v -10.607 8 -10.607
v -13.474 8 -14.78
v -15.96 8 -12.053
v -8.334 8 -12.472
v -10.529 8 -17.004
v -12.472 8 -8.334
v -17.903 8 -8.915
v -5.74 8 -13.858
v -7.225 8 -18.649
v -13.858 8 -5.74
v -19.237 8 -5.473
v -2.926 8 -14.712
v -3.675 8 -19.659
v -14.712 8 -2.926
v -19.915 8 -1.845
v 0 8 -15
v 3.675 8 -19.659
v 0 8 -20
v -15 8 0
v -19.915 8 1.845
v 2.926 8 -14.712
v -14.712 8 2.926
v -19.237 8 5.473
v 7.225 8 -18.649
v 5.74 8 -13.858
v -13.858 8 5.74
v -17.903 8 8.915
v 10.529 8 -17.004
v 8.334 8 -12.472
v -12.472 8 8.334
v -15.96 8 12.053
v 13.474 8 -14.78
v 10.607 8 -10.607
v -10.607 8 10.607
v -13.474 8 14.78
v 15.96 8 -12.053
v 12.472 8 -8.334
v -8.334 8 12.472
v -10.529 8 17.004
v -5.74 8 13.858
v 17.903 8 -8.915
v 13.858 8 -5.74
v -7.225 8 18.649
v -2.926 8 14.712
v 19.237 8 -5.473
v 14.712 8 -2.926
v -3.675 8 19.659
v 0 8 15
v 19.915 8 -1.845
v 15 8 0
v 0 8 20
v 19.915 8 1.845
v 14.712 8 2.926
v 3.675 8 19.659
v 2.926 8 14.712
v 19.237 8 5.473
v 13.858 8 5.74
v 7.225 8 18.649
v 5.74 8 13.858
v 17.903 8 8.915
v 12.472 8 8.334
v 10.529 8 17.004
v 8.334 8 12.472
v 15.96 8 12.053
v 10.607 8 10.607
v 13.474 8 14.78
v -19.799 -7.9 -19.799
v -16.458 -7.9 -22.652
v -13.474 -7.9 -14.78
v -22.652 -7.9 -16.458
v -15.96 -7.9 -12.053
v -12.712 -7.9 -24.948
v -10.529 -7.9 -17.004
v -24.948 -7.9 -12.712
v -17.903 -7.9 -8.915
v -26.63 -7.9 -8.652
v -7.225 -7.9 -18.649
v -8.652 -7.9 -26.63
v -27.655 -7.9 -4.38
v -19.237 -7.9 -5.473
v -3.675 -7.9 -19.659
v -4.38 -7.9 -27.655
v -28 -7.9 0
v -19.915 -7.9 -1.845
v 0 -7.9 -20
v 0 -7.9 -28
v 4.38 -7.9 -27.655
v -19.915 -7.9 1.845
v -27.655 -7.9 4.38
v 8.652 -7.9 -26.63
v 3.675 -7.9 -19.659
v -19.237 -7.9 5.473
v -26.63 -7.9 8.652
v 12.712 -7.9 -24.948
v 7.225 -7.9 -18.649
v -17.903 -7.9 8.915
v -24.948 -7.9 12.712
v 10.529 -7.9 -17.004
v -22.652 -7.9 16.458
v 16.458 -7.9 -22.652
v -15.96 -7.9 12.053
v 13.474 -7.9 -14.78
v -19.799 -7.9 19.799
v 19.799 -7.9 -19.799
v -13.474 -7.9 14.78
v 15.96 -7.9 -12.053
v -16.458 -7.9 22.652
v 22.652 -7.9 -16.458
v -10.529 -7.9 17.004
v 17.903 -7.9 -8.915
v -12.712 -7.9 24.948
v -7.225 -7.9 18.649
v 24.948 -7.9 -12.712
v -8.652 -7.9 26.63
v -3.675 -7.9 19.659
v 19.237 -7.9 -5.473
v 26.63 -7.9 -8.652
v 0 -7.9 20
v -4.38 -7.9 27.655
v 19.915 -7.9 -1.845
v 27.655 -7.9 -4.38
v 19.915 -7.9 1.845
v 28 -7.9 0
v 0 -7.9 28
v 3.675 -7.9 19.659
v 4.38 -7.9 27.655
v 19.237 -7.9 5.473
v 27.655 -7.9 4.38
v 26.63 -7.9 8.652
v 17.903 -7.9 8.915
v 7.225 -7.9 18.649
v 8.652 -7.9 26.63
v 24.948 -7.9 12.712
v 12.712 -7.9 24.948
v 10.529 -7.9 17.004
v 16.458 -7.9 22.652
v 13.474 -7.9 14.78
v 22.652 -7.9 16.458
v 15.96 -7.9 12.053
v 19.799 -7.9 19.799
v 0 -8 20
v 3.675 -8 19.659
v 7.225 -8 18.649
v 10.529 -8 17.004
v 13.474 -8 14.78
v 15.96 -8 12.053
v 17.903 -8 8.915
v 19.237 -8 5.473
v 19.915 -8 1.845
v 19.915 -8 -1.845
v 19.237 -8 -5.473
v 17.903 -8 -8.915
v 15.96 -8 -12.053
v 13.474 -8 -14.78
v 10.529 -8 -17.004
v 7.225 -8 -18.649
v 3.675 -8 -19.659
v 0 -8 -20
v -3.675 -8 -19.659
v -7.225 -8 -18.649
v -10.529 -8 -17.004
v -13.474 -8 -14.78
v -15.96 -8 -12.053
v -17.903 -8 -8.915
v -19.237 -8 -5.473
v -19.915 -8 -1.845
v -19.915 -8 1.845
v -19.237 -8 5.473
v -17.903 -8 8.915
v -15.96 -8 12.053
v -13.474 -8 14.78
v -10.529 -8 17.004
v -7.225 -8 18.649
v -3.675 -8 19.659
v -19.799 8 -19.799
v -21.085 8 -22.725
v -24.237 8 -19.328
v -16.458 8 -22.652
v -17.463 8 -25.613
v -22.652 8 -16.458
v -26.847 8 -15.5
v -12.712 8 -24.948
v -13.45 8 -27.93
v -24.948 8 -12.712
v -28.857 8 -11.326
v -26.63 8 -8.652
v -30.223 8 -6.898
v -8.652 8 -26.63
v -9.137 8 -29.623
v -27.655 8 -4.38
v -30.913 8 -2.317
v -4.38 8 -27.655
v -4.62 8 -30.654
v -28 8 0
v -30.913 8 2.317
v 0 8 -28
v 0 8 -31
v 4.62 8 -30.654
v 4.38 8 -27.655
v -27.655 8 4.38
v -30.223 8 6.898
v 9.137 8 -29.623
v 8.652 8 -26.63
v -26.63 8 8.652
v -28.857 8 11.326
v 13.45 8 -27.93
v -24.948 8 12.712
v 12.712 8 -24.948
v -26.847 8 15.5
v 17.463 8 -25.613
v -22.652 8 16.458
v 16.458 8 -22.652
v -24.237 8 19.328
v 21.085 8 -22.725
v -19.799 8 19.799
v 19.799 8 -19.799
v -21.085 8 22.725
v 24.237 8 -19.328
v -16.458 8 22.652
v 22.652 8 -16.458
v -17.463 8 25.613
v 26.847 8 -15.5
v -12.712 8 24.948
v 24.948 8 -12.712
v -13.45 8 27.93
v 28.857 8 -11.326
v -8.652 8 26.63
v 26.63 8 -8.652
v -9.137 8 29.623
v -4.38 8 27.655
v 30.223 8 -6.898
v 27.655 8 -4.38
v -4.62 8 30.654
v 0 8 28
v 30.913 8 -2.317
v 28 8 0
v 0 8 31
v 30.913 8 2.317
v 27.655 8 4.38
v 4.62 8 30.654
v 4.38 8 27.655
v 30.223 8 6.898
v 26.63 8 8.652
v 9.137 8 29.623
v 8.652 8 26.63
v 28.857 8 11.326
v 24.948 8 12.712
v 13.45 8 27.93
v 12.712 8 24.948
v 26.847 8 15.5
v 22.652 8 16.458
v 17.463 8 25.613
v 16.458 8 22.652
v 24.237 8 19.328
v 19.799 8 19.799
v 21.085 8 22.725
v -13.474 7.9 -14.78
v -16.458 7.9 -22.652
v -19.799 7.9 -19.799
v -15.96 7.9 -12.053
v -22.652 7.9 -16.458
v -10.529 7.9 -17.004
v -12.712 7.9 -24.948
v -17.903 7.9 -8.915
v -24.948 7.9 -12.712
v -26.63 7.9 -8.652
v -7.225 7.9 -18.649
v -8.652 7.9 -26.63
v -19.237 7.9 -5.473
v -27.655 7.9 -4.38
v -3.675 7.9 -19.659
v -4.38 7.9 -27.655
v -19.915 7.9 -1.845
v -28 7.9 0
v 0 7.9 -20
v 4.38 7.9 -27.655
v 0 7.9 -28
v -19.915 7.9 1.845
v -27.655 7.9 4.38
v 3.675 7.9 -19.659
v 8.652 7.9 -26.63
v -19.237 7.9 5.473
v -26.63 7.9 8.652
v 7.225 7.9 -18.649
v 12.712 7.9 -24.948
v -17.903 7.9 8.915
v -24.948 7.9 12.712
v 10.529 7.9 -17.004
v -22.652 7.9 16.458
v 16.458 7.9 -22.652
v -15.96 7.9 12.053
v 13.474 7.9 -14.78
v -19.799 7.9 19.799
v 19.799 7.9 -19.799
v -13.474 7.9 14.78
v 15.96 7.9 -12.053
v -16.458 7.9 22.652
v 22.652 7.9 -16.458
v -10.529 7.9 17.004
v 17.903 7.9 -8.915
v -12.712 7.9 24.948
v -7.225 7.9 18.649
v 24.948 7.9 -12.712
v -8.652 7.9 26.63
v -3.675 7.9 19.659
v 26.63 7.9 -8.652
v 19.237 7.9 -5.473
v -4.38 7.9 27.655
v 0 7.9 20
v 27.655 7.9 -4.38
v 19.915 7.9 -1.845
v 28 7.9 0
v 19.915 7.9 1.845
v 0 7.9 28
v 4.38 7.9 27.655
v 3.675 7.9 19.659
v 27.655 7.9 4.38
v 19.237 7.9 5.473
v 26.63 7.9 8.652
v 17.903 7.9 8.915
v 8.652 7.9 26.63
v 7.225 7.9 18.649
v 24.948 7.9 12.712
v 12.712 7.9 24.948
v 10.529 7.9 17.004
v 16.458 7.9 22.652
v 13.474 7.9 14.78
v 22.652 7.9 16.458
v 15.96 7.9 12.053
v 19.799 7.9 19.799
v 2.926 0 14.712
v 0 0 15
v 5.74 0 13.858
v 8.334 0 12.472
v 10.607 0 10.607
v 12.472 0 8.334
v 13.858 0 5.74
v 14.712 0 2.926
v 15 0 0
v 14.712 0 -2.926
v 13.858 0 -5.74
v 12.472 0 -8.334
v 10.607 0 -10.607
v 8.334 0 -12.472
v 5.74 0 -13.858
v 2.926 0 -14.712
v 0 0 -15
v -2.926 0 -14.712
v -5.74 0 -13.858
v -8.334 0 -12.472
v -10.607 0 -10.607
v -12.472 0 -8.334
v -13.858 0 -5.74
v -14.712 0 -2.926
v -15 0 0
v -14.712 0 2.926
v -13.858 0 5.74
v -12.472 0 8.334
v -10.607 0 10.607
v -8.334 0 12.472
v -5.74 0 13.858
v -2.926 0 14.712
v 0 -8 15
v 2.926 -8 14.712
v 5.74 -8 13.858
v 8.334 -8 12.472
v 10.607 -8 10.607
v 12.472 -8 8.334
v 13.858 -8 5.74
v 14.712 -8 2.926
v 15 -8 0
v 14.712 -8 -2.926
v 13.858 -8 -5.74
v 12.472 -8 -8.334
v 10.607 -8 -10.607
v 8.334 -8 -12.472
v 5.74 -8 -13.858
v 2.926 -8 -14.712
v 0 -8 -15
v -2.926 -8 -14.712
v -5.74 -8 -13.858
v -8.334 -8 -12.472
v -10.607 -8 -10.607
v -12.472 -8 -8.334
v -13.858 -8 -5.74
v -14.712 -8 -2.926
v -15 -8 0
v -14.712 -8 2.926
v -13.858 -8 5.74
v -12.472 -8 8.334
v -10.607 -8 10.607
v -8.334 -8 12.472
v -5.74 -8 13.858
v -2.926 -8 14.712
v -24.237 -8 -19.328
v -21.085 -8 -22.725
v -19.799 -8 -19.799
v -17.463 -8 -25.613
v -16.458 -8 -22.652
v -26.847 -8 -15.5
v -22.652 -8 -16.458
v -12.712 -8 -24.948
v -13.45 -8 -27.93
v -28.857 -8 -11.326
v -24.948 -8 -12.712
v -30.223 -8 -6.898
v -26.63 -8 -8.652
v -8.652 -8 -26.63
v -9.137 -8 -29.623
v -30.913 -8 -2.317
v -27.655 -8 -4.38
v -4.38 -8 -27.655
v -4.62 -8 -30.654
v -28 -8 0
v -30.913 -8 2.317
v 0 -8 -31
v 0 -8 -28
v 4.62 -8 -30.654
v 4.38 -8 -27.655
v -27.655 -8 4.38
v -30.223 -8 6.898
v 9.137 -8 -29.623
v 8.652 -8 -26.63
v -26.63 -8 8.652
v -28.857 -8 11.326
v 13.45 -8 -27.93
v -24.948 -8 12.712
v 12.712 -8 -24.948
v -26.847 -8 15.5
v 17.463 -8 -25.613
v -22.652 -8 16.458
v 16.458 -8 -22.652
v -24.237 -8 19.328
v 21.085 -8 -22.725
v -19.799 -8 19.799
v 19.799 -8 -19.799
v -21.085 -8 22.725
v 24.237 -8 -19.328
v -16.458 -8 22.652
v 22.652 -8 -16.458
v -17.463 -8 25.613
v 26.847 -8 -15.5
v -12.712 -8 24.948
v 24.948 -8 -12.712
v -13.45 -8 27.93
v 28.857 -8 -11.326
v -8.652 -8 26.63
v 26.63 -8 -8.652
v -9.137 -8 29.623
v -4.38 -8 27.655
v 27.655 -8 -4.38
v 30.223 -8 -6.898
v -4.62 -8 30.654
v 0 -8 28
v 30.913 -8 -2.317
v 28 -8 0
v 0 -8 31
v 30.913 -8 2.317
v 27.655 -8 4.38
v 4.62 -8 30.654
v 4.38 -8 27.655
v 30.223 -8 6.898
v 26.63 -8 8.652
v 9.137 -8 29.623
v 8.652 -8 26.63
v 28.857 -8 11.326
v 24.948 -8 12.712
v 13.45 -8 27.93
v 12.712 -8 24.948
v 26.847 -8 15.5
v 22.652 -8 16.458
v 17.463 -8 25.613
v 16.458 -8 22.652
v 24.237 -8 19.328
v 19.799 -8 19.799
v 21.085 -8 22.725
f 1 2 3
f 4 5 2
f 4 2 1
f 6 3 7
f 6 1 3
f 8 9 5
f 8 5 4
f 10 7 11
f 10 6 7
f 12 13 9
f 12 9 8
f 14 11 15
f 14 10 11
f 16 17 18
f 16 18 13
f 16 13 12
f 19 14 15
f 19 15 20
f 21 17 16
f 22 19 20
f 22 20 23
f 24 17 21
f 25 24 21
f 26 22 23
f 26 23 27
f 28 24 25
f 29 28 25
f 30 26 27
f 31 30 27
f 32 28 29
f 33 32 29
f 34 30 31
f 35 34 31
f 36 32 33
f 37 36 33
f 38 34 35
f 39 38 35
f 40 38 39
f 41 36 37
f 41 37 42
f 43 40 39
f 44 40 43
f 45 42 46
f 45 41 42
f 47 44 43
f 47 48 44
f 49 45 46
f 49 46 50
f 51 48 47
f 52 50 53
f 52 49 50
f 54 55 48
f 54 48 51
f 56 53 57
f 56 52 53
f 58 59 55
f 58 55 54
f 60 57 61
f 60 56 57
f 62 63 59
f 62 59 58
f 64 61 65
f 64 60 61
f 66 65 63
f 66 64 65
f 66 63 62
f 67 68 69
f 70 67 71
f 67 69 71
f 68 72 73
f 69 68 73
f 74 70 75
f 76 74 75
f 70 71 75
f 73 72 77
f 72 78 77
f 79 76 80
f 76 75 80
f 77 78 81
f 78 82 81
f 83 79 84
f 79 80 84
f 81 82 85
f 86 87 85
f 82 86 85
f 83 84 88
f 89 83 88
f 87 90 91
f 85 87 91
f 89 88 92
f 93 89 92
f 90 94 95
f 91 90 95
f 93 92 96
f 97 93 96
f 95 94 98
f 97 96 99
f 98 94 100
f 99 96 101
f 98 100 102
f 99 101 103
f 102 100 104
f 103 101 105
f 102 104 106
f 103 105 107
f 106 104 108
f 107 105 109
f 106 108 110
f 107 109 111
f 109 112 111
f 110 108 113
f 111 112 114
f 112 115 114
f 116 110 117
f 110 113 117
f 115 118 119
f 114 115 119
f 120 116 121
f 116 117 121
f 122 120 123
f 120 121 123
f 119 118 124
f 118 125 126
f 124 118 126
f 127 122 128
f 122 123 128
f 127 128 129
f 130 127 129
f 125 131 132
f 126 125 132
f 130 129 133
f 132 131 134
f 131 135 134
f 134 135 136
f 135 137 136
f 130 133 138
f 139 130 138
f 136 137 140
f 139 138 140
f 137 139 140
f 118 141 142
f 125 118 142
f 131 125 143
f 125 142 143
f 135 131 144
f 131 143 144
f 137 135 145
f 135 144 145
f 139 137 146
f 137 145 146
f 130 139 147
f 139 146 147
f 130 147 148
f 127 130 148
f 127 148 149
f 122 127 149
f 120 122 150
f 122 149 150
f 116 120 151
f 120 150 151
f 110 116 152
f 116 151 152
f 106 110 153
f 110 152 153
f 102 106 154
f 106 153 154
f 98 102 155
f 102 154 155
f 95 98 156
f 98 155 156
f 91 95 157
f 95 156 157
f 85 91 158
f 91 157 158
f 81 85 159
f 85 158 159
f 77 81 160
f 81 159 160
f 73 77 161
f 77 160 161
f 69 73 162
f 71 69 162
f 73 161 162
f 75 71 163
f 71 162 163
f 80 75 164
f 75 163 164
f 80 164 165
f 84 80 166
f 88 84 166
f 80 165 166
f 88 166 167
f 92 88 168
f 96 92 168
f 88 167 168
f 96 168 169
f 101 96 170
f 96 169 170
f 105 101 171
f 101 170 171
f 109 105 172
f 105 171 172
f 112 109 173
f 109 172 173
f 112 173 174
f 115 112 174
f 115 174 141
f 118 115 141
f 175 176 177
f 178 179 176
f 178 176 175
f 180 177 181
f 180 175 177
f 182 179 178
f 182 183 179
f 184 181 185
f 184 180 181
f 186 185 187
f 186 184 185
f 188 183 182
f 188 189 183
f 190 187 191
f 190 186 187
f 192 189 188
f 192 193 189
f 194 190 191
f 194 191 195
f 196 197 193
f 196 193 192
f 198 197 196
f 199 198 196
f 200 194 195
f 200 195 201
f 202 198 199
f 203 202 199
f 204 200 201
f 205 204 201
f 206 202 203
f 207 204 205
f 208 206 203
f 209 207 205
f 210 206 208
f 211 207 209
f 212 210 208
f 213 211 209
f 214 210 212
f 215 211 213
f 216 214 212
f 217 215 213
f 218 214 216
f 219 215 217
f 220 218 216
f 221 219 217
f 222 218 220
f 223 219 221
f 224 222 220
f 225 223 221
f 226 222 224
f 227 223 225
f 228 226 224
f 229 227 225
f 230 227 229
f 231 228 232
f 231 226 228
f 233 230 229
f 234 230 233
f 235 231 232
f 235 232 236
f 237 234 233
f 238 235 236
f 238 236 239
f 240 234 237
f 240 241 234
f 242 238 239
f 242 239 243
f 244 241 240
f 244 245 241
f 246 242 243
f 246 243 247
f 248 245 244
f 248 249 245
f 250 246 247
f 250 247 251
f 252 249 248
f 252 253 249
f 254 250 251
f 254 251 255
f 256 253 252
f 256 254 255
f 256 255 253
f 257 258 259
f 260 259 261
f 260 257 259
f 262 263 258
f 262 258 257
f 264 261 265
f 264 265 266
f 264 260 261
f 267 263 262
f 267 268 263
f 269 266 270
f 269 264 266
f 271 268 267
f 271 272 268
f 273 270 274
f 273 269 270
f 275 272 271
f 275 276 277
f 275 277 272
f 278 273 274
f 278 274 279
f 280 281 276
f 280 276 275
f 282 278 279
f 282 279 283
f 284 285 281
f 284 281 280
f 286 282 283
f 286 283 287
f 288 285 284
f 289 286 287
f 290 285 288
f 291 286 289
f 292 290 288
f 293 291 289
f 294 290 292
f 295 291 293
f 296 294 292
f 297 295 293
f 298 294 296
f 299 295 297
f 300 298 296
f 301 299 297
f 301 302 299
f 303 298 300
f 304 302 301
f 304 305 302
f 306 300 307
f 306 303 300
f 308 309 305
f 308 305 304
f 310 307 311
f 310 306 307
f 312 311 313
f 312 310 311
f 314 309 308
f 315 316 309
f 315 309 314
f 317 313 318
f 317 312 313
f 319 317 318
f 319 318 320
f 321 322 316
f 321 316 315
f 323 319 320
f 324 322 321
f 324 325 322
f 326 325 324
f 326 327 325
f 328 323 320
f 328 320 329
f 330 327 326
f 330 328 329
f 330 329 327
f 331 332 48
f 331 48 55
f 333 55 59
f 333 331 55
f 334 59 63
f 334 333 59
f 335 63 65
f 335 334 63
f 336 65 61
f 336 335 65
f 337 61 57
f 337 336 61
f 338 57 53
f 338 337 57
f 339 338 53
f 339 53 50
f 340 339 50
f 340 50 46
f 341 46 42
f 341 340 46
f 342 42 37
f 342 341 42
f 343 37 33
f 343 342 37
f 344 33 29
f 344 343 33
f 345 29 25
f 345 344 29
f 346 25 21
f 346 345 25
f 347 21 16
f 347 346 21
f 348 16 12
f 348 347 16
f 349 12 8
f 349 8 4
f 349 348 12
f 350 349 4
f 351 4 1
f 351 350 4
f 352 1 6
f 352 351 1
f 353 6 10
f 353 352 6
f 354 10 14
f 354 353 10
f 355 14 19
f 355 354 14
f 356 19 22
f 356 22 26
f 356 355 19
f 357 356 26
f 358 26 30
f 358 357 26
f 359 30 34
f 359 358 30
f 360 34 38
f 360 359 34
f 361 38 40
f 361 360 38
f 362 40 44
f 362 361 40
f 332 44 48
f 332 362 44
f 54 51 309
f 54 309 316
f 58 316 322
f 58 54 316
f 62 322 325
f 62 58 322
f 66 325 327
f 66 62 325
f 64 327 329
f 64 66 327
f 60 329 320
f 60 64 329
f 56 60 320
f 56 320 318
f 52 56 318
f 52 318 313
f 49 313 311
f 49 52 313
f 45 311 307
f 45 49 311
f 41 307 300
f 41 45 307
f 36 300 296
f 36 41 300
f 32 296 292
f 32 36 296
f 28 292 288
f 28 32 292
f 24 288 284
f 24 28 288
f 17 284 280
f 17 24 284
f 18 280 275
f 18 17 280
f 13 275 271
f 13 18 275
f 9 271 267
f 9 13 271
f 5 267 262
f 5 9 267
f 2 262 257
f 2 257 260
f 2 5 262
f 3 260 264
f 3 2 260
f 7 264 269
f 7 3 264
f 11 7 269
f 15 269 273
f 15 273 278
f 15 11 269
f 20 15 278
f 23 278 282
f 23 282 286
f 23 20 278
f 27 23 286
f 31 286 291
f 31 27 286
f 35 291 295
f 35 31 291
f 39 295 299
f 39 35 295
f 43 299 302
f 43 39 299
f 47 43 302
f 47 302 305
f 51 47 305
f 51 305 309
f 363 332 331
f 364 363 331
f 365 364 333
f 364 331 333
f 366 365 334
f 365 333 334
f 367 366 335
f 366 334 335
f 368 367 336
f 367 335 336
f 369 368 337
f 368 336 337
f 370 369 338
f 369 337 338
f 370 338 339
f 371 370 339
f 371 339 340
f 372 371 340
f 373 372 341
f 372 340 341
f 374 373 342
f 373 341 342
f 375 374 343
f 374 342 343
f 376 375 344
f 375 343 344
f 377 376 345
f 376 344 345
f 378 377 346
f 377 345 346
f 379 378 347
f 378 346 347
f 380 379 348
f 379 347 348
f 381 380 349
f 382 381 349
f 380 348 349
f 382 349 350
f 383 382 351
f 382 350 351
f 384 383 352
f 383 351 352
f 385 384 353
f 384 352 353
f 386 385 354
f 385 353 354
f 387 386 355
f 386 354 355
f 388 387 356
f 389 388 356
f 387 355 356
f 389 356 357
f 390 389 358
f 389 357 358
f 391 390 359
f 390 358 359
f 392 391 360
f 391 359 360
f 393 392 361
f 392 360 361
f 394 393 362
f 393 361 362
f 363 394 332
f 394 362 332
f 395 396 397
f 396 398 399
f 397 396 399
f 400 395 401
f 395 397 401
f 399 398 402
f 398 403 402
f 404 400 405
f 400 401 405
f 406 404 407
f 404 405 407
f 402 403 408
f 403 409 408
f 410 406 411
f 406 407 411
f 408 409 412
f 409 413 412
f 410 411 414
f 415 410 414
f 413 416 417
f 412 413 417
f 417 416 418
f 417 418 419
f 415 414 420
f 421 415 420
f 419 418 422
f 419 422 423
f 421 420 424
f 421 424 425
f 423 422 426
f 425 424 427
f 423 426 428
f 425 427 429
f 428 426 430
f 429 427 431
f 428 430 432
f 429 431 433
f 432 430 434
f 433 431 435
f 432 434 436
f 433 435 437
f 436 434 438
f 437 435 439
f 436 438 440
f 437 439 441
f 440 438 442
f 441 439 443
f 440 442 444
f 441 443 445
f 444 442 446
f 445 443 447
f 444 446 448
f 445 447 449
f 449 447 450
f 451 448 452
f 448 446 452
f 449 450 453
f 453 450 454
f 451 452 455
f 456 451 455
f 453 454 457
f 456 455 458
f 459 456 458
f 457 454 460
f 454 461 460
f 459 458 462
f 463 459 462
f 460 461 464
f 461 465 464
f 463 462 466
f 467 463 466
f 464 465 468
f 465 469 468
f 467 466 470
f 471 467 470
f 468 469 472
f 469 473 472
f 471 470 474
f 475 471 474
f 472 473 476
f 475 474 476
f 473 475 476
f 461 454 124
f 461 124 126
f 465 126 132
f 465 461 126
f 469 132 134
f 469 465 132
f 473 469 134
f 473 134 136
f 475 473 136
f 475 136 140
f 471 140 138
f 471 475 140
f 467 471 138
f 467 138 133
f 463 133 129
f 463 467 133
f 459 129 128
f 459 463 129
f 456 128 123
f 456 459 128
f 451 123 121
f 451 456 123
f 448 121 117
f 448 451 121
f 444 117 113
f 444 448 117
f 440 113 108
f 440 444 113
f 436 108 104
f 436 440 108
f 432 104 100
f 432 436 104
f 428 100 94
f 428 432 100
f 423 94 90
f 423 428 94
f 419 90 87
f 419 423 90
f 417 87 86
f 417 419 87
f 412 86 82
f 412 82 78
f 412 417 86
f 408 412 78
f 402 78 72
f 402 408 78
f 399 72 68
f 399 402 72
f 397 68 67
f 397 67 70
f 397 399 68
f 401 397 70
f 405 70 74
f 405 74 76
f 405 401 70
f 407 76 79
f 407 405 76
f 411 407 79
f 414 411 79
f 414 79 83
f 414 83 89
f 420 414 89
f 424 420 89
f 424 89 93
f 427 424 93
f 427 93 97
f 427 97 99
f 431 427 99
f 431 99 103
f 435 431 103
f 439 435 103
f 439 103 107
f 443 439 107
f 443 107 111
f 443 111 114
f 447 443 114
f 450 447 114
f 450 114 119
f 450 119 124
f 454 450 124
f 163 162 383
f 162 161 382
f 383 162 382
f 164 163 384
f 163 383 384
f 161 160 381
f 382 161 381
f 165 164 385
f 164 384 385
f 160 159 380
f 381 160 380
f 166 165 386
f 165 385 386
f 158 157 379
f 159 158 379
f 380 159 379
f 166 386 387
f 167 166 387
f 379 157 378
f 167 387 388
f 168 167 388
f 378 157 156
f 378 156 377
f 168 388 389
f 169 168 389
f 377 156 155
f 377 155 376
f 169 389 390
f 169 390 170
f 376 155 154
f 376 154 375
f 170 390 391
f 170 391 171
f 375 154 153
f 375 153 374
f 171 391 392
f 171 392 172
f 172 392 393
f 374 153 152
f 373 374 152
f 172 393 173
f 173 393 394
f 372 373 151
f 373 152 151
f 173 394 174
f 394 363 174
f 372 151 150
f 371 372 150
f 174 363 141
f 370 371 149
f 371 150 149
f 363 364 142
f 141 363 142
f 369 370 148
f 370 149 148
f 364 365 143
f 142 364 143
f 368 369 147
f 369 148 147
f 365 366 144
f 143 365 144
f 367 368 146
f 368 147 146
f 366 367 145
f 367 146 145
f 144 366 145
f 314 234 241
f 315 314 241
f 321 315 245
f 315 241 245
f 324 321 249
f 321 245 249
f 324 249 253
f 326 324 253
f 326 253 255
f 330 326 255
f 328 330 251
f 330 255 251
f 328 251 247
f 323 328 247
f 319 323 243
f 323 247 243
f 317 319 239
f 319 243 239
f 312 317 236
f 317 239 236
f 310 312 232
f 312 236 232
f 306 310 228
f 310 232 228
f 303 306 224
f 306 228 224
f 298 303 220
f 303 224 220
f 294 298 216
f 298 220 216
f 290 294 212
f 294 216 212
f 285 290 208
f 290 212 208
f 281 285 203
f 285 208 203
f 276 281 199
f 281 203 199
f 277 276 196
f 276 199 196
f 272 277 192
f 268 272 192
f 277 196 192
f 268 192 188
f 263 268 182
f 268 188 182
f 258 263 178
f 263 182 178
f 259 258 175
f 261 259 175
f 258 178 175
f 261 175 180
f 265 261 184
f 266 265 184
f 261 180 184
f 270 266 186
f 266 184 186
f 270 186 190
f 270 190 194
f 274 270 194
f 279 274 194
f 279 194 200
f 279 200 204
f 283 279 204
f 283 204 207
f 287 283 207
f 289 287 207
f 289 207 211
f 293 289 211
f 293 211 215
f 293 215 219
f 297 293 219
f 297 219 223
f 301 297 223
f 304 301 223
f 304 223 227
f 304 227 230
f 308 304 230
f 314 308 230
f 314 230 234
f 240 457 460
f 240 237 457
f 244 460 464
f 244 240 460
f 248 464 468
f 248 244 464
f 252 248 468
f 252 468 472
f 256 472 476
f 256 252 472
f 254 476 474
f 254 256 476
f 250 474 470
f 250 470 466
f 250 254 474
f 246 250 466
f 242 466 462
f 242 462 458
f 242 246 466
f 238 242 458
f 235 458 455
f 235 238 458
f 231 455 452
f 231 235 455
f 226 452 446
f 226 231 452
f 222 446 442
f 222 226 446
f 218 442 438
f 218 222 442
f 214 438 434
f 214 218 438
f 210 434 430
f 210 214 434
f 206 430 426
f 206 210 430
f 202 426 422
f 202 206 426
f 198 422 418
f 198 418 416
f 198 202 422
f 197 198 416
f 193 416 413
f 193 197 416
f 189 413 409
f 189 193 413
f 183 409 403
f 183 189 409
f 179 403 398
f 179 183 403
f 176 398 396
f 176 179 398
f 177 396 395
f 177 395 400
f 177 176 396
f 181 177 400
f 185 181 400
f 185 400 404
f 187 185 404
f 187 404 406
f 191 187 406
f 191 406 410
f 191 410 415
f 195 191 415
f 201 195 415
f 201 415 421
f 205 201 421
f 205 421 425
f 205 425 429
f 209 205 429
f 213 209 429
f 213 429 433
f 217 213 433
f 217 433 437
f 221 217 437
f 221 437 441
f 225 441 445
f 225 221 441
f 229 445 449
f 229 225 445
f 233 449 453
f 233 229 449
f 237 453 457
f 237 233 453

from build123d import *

# Parameters (mm, degrees)
SKETCH1_R           = 31
SKETCH1_R_2         = 15
BOSS_EXTRUDE2_DEPTH = 8
SKETCH4_R           = 28
SKETCH4_R_2         = 20
CUT_EXTRUDE2_DEPTH  = 0.1


with BuildPart() as part:
    # Sketch1 → Boss-Extrude2 (new body)
    with BuildSketch(Plane(origin=(0, 0, 0), x_dir=(1, 0, 0), z_dir=(0, 1, 0))):
        with Locations(Location((0, 0, 0), (0, 0, 270))):
            Circle(SKETCH1_R)
        with Locations(Location((0, 0, 0), (0, 0, 270))):
            Circle(SKETCH1_R_2, mode=Mode.SUBTRACT)
    boss_extrude2 = extrude(amount=BOSS_EXTRUDE2_DEPTH)

    # Sketch4 → Cut-Extrude2 (cut)
    with BuildSketch(Plane(origin=(0, 8, 0), x_dir=(1, 0, 0), z_dir=(0, 1, 0))):
        with Locations(Location((0, 0, 0), (0, 0, 270))):
            Circle(SKETCH4_R)
        with Locations(Location((0, 0, 0), (0, 0, 270))):
            Circle(SKETCH4_R_2, mode=Mode.SUBTRACT)
    cut_extrude2 = extrude(amount=-CUT_EXTRUDE2_DEPTH, mode=Mode.SUBTRACT)


with BuildPart() as mirror2_1:
    # Mirror2: Boss-Extrude2 across Top Plane
    add(boss_extrude2.mirror(Plane(origin=(0, 0, 0), x_dir=(1, 0, 0), z_dir=(0, 1, 0))))

    # Mirror2 2: Cut-Extrude2 across Top Plane
    add(cut_extrude2.mirror(Plane(origin=(0, 0, 0), x_dir=(1, 0, 0), z_dir=(0, 1, 0))), mode=Mode.SUBTRACT)


with BuildPart() as part_1:
    add(part.part)

    # Mirror2 united with what the copies touc: union Mirror2_1
    add(mirror2_1.part)


solid = part_1.part
